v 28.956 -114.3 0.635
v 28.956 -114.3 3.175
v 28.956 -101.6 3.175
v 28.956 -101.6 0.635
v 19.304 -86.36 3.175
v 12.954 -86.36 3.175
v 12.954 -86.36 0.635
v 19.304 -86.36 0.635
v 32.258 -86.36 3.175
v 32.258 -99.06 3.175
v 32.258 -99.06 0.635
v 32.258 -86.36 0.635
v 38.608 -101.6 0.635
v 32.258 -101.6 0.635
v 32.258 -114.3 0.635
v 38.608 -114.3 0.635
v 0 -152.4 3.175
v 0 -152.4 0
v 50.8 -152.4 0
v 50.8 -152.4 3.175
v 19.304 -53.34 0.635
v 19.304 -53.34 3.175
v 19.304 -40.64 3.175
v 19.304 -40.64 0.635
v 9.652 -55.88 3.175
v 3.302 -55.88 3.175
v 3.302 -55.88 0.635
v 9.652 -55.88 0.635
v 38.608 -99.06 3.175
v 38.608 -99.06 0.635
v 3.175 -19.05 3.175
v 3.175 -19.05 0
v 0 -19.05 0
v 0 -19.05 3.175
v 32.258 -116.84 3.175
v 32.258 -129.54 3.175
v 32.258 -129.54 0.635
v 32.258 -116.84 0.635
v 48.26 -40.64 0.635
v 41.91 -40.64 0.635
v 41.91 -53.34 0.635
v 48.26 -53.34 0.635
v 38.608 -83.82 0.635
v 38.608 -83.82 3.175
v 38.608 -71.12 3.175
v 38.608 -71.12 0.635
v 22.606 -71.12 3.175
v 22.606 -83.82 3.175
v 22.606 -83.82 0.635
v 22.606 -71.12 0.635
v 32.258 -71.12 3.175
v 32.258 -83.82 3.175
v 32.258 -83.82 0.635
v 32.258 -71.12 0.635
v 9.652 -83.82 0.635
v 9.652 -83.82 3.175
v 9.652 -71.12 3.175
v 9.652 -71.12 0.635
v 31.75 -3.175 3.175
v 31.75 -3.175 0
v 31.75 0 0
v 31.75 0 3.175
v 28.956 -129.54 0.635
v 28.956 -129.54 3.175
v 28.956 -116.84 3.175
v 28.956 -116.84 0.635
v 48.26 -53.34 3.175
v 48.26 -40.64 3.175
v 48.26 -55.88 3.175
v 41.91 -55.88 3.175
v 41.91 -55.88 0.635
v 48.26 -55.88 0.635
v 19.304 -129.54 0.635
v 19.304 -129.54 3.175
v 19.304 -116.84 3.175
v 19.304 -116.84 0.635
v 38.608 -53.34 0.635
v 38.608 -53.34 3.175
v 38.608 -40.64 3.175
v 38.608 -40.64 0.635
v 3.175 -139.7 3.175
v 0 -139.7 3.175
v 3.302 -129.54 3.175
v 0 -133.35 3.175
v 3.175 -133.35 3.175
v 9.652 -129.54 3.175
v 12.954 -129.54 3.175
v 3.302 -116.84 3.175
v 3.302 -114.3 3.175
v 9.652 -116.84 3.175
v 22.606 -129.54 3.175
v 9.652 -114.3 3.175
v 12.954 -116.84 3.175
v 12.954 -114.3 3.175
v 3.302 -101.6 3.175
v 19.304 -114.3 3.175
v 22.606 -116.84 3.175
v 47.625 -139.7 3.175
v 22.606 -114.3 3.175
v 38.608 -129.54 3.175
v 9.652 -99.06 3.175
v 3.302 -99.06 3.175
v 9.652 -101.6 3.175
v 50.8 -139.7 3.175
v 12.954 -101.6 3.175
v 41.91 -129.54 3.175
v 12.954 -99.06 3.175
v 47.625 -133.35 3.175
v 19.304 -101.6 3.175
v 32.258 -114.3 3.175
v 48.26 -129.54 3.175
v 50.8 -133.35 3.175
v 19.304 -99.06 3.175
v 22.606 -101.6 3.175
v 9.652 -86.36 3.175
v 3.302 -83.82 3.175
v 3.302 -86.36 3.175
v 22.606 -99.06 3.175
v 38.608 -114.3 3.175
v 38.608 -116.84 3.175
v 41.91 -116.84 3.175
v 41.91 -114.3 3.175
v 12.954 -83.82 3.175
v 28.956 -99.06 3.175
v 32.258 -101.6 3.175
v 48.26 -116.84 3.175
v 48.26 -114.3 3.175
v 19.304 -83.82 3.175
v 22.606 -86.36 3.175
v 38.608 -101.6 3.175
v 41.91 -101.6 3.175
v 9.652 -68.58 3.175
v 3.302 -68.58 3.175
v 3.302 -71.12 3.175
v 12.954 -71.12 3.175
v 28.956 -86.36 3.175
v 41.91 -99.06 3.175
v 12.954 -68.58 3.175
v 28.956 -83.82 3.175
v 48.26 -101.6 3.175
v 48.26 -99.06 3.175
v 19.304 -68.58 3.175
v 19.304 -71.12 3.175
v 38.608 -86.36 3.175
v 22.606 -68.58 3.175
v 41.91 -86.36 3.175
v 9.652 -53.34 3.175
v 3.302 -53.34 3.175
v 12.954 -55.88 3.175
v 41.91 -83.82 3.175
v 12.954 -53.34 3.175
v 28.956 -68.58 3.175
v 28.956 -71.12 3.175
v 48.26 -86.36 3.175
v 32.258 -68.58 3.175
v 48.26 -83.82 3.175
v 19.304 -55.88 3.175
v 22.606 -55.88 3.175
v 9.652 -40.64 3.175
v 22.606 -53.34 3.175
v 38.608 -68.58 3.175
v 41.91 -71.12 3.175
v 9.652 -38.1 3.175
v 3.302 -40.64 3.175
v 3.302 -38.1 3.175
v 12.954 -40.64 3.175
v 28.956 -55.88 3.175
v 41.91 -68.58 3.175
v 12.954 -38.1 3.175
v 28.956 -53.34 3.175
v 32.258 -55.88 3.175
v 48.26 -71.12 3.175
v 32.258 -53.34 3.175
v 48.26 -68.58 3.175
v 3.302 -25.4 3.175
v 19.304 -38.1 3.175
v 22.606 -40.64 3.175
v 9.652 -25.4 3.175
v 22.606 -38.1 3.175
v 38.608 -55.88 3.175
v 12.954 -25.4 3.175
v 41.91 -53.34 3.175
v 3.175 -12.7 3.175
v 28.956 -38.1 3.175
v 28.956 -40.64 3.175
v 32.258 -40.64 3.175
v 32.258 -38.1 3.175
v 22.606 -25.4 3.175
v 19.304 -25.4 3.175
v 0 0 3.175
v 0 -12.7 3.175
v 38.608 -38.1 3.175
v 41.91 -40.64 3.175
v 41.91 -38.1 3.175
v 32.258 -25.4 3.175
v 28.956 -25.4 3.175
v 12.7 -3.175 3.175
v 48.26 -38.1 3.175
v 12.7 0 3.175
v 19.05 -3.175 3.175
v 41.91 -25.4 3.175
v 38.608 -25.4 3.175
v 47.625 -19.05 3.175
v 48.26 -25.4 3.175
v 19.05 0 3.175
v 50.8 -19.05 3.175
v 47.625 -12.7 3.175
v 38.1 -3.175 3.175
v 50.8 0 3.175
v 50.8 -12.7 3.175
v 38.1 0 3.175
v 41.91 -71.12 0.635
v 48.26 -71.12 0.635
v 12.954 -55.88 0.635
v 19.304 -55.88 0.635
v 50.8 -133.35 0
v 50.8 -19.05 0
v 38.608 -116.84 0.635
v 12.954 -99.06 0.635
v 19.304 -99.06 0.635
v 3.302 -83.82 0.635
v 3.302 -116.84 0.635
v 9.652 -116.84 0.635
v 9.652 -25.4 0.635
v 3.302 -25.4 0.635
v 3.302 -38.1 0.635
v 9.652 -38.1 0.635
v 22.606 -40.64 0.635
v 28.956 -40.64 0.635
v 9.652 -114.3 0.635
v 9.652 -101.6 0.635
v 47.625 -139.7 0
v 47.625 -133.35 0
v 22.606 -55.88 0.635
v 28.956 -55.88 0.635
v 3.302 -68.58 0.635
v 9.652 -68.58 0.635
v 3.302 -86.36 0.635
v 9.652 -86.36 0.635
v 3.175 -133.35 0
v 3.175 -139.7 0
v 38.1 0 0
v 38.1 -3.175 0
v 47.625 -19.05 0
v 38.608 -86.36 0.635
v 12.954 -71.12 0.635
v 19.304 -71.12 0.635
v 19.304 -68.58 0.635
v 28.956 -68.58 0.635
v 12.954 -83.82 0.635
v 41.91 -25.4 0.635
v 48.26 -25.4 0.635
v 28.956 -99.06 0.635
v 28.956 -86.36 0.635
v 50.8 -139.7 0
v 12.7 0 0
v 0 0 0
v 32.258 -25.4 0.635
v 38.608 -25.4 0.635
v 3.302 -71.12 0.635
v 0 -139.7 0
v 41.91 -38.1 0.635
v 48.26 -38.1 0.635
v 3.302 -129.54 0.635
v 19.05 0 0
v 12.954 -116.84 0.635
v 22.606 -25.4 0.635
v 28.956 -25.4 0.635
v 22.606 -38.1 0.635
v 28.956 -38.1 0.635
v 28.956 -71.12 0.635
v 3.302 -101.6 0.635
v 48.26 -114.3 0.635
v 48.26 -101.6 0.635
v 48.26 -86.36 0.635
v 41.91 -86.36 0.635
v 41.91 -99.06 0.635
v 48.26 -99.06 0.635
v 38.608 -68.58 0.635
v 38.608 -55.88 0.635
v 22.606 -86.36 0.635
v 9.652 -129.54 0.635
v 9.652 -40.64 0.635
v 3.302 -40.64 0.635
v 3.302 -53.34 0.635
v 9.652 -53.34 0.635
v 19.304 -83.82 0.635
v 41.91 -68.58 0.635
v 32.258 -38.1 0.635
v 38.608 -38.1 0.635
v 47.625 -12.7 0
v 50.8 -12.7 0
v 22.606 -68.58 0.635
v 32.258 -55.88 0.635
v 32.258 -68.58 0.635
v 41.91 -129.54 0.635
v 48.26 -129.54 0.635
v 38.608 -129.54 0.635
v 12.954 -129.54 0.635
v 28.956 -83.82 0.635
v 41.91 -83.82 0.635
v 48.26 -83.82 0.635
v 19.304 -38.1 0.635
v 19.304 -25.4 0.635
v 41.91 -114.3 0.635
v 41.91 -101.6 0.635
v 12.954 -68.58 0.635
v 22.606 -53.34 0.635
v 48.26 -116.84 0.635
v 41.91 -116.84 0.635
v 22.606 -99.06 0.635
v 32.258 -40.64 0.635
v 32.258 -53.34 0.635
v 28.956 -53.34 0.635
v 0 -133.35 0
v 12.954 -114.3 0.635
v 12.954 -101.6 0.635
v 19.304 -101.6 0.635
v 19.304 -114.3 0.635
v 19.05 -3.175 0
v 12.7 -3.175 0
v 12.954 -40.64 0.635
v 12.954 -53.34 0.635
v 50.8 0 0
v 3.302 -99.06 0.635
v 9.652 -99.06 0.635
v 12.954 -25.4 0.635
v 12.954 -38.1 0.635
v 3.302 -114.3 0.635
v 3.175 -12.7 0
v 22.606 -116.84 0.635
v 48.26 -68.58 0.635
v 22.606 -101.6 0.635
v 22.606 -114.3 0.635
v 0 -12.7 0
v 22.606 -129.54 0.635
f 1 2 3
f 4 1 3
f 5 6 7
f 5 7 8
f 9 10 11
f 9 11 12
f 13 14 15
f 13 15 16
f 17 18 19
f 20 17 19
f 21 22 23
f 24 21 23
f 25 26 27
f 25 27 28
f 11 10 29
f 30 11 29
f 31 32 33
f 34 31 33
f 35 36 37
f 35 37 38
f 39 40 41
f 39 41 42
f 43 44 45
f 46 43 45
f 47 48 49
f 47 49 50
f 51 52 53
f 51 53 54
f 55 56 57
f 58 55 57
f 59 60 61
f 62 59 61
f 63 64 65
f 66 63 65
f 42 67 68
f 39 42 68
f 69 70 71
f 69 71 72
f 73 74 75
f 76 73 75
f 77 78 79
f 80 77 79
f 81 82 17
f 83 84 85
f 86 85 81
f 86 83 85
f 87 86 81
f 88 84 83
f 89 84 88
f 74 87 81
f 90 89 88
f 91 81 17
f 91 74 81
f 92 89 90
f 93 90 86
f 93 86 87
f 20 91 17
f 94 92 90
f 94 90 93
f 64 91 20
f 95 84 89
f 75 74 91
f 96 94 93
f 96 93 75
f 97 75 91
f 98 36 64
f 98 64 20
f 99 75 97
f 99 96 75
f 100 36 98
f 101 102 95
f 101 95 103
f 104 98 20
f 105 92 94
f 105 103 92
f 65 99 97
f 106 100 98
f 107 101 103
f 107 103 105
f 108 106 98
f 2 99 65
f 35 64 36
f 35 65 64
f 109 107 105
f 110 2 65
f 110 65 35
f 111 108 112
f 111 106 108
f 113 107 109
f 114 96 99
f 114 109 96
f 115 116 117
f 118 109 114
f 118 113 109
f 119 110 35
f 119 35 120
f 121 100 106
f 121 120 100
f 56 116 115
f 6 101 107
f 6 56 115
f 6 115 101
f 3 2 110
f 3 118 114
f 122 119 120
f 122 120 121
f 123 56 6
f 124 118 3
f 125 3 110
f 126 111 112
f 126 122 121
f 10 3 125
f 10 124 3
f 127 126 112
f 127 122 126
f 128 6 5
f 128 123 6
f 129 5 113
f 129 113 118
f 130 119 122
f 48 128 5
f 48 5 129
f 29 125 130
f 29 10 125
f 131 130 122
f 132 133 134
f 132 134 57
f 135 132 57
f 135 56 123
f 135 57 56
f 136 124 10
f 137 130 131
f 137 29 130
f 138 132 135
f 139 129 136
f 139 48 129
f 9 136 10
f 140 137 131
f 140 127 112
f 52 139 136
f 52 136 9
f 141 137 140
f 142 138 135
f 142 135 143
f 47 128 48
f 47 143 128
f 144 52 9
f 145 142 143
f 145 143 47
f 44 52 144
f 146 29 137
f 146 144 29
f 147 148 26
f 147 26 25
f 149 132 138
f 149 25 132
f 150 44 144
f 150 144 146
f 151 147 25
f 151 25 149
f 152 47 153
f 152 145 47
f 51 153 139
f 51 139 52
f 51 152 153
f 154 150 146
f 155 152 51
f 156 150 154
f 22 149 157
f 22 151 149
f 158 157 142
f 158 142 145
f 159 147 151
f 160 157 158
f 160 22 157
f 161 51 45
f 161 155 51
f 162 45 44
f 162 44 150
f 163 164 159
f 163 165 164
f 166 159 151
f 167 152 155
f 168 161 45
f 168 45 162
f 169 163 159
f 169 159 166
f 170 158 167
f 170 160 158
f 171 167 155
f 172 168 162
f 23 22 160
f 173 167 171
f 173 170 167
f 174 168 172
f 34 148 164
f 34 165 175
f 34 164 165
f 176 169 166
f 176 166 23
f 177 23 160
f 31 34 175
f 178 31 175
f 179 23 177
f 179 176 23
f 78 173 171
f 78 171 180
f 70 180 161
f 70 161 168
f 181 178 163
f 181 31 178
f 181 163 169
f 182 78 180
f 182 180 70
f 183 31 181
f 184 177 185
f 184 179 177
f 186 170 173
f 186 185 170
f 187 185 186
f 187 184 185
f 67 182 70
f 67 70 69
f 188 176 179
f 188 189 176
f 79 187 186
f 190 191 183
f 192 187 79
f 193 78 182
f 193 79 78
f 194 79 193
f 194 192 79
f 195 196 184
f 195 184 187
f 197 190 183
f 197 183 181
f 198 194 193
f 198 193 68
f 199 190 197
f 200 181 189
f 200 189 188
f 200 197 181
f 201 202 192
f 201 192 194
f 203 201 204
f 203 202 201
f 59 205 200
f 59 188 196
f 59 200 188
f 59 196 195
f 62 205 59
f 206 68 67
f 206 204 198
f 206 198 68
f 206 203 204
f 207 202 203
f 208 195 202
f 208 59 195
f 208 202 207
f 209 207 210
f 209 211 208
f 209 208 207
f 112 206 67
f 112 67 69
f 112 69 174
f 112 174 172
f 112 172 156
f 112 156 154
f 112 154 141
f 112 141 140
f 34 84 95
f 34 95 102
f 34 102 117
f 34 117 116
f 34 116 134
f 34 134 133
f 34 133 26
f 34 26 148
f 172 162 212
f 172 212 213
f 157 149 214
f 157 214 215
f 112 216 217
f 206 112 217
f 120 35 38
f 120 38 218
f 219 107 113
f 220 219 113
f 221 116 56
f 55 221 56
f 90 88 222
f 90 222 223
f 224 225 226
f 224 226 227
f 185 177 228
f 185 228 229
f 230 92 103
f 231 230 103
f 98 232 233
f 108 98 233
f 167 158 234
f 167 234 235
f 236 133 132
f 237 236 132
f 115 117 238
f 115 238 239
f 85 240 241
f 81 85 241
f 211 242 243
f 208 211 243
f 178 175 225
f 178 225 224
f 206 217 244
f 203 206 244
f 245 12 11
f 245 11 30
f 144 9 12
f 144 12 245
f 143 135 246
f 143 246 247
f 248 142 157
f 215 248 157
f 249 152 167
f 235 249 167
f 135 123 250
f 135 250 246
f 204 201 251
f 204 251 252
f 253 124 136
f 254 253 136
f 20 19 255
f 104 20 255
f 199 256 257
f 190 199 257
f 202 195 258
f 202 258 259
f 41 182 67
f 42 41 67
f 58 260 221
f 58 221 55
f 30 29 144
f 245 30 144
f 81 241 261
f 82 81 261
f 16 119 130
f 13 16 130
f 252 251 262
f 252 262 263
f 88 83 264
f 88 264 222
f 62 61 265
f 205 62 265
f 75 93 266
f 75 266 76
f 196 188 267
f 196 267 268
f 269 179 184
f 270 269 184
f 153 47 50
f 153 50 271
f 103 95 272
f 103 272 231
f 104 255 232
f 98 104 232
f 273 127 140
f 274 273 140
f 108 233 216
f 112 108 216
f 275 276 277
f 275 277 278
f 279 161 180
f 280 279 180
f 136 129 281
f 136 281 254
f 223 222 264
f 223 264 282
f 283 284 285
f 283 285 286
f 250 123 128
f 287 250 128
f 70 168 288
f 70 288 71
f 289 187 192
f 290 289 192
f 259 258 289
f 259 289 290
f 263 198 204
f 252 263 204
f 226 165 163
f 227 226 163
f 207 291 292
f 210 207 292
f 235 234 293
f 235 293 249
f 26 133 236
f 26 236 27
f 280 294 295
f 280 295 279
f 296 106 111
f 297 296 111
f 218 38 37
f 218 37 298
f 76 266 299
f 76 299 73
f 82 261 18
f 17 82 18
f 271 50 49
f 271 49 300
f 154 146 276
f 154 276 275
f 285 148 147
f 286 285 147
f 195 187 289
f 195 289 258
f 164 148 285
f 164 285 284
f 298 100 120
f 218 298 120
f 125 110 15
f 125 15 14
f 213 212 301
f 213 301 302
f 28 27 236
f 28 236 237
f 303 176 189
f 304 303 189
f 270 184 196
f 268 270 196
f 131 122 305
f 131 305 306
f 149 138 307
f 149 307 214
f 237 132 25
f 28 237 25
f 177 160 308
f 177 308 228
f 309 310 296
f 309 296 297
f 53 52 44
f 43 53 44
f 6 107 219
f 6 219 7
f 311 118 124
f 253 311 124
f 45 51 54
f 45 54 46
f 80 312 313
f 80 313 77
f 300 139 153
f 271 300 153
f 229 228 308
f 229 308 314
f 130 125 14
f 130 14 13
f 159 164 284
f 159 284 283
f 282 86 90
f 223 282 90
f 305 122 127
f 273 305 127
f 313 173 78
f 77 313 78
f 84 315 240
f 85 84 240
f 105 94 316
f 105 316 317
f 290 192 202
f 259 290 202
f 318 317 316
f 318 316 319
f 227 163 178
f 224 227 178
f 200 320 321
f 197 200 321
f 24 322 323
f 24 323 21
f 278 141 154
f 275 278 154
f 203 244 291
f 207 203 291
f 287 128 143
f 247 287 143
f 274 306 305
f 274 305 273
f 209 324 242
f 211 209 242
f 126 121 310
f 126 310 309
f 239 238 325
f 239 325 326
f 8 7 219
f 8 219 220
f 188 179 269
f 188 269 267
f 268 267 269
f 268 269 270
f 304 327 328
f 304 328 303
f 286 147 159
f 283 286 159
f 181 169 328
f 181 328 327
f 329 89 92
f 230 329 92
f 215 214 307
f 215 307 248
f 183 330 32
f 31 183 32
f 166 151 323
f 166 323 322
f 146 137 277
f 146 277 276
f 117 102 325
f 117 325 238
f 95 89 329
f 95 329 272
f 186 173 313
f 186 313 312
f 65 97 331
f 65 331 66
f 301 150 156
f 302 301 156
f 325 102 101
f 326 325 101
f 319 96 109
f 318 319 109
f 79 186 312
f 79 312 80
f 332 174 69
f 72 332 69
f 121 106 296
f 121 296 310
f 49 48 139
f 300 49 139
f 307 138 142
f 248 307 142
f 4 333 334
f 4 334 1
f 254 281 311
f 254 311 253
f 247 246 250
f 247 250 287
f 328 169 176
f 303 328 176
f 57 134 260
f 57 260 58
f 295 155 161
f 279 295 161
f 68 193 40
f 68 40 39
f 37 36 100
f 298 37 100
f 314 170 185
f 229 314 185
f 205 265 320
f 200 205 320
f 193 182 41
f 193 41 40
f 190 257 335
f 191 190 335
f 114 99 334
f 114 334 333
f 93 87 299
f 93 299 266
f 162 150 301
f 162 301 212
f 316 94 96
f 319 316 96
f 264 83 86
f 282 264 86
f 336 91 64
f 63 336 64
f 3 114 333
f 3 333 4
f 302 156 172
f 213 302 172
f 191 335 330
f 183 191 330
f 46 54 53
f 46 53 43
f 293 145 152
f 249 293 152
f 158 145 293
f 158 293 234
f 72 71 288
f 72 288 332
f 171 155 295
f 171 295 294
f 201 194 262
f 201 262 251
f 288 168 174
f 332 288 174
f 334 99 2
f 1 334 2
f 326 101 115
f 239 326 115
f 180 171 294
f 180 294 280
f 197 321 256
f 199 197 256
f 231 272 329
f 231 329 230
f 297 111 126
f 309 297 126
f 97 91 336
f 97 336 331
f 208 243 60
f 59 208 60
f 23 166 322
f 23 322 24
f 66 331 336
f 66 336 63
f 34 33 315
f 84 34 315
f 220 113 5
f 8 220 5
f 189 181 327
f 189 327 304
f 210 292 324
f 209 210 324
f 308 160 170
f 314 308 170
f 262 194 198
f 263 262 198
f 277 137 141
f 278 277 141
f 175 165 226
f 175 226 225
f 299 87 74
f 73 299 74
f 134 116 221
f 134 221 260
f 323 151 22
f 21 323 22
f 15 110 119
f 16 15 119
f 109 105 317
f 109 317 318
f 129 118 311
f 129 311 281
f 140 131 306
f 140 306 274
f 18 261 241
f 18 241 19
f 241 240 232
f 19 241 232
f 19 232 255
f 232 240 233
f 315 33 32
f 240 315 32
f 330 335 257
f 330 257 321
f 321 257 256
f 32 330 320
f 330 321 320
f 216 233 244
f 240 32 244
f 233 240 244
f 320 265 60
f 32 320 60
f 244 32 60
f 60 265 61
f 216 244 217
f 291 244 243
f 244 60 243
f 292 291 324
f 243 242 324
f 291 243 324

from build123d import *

# Parameters (mm, degrees)
BOSS_EXTRUDE1_DEPTH  = 3.175
SKETCH2_W            = 6.35
SKETCH2_H            = 12.7
CUT_EXTRUDE1_DEPTH   = 2.54
LPATTERN1_COUNT      = 5
LPATTERN1_PITCH      = 9.652
LPATTERN1_COUNT_DIR2 = 7
LPATTERN1_PITCH_DIR2 = 15.24


with BuildPart() as part:
    # Sketch1 → Boss-Extrude1 (new body)
    with BuildSketch(Plane.XY):
        Polygon((0, -152.4), (12.7, -152.4), (38.1, -152.4), (50.8, -152.4), (50.8, -139.7), (47.625, -139.7), (47.625, -133.35), (50.8, -133.35), (50.8, -19.05), (47.625, -19.05), (47.625, -12.7), (50.8, -12.7), (50.8, 0), (38.1, 0), (38.1, -3.175), (31.75, -3.175), (31.75, 0), (19.05, 0), (19.05, -3.175), (12.7, -3.175), (12.7, 0), (0, 0), (0, -12.7), (3.175, -12.7), (3.175, -19.05), (0, -19.05), (0, -133.35), (3.175, -133.35), (3.175, -139.7), (0, -139.7), align=None)
    extrude(amount=BOSS_EXTRUDE1_DEPTH)

    # Sketch2 → Cut-Extrude1 (cut)
    with BuildSketch(Plane.XY.offset(3.175)):
        with Locations((6.477, -31.75)):
            Rectangle(SKETCH2_W, SKETCH2_H)
    cut_extrude1 = extrude(amount=-CUT_EXTRUDE1_DEPTH, mode=Mode.SUBTRACT)

    # LPattern1: Cut-Extrude1 5 × 7
    with Locations(*[(i * LPATTERN1_PITCH, -j * LPATTERN1_PITCH_DIR2, 0) for i in range(LPATTERN1_COUNT) for j in range(LPATTERN1_COUNT_DIR2) if (i, j) != (0, 0)]):
        add(cut_extrude1, mode=Mode.SUBTRACT)


solid = part.part
